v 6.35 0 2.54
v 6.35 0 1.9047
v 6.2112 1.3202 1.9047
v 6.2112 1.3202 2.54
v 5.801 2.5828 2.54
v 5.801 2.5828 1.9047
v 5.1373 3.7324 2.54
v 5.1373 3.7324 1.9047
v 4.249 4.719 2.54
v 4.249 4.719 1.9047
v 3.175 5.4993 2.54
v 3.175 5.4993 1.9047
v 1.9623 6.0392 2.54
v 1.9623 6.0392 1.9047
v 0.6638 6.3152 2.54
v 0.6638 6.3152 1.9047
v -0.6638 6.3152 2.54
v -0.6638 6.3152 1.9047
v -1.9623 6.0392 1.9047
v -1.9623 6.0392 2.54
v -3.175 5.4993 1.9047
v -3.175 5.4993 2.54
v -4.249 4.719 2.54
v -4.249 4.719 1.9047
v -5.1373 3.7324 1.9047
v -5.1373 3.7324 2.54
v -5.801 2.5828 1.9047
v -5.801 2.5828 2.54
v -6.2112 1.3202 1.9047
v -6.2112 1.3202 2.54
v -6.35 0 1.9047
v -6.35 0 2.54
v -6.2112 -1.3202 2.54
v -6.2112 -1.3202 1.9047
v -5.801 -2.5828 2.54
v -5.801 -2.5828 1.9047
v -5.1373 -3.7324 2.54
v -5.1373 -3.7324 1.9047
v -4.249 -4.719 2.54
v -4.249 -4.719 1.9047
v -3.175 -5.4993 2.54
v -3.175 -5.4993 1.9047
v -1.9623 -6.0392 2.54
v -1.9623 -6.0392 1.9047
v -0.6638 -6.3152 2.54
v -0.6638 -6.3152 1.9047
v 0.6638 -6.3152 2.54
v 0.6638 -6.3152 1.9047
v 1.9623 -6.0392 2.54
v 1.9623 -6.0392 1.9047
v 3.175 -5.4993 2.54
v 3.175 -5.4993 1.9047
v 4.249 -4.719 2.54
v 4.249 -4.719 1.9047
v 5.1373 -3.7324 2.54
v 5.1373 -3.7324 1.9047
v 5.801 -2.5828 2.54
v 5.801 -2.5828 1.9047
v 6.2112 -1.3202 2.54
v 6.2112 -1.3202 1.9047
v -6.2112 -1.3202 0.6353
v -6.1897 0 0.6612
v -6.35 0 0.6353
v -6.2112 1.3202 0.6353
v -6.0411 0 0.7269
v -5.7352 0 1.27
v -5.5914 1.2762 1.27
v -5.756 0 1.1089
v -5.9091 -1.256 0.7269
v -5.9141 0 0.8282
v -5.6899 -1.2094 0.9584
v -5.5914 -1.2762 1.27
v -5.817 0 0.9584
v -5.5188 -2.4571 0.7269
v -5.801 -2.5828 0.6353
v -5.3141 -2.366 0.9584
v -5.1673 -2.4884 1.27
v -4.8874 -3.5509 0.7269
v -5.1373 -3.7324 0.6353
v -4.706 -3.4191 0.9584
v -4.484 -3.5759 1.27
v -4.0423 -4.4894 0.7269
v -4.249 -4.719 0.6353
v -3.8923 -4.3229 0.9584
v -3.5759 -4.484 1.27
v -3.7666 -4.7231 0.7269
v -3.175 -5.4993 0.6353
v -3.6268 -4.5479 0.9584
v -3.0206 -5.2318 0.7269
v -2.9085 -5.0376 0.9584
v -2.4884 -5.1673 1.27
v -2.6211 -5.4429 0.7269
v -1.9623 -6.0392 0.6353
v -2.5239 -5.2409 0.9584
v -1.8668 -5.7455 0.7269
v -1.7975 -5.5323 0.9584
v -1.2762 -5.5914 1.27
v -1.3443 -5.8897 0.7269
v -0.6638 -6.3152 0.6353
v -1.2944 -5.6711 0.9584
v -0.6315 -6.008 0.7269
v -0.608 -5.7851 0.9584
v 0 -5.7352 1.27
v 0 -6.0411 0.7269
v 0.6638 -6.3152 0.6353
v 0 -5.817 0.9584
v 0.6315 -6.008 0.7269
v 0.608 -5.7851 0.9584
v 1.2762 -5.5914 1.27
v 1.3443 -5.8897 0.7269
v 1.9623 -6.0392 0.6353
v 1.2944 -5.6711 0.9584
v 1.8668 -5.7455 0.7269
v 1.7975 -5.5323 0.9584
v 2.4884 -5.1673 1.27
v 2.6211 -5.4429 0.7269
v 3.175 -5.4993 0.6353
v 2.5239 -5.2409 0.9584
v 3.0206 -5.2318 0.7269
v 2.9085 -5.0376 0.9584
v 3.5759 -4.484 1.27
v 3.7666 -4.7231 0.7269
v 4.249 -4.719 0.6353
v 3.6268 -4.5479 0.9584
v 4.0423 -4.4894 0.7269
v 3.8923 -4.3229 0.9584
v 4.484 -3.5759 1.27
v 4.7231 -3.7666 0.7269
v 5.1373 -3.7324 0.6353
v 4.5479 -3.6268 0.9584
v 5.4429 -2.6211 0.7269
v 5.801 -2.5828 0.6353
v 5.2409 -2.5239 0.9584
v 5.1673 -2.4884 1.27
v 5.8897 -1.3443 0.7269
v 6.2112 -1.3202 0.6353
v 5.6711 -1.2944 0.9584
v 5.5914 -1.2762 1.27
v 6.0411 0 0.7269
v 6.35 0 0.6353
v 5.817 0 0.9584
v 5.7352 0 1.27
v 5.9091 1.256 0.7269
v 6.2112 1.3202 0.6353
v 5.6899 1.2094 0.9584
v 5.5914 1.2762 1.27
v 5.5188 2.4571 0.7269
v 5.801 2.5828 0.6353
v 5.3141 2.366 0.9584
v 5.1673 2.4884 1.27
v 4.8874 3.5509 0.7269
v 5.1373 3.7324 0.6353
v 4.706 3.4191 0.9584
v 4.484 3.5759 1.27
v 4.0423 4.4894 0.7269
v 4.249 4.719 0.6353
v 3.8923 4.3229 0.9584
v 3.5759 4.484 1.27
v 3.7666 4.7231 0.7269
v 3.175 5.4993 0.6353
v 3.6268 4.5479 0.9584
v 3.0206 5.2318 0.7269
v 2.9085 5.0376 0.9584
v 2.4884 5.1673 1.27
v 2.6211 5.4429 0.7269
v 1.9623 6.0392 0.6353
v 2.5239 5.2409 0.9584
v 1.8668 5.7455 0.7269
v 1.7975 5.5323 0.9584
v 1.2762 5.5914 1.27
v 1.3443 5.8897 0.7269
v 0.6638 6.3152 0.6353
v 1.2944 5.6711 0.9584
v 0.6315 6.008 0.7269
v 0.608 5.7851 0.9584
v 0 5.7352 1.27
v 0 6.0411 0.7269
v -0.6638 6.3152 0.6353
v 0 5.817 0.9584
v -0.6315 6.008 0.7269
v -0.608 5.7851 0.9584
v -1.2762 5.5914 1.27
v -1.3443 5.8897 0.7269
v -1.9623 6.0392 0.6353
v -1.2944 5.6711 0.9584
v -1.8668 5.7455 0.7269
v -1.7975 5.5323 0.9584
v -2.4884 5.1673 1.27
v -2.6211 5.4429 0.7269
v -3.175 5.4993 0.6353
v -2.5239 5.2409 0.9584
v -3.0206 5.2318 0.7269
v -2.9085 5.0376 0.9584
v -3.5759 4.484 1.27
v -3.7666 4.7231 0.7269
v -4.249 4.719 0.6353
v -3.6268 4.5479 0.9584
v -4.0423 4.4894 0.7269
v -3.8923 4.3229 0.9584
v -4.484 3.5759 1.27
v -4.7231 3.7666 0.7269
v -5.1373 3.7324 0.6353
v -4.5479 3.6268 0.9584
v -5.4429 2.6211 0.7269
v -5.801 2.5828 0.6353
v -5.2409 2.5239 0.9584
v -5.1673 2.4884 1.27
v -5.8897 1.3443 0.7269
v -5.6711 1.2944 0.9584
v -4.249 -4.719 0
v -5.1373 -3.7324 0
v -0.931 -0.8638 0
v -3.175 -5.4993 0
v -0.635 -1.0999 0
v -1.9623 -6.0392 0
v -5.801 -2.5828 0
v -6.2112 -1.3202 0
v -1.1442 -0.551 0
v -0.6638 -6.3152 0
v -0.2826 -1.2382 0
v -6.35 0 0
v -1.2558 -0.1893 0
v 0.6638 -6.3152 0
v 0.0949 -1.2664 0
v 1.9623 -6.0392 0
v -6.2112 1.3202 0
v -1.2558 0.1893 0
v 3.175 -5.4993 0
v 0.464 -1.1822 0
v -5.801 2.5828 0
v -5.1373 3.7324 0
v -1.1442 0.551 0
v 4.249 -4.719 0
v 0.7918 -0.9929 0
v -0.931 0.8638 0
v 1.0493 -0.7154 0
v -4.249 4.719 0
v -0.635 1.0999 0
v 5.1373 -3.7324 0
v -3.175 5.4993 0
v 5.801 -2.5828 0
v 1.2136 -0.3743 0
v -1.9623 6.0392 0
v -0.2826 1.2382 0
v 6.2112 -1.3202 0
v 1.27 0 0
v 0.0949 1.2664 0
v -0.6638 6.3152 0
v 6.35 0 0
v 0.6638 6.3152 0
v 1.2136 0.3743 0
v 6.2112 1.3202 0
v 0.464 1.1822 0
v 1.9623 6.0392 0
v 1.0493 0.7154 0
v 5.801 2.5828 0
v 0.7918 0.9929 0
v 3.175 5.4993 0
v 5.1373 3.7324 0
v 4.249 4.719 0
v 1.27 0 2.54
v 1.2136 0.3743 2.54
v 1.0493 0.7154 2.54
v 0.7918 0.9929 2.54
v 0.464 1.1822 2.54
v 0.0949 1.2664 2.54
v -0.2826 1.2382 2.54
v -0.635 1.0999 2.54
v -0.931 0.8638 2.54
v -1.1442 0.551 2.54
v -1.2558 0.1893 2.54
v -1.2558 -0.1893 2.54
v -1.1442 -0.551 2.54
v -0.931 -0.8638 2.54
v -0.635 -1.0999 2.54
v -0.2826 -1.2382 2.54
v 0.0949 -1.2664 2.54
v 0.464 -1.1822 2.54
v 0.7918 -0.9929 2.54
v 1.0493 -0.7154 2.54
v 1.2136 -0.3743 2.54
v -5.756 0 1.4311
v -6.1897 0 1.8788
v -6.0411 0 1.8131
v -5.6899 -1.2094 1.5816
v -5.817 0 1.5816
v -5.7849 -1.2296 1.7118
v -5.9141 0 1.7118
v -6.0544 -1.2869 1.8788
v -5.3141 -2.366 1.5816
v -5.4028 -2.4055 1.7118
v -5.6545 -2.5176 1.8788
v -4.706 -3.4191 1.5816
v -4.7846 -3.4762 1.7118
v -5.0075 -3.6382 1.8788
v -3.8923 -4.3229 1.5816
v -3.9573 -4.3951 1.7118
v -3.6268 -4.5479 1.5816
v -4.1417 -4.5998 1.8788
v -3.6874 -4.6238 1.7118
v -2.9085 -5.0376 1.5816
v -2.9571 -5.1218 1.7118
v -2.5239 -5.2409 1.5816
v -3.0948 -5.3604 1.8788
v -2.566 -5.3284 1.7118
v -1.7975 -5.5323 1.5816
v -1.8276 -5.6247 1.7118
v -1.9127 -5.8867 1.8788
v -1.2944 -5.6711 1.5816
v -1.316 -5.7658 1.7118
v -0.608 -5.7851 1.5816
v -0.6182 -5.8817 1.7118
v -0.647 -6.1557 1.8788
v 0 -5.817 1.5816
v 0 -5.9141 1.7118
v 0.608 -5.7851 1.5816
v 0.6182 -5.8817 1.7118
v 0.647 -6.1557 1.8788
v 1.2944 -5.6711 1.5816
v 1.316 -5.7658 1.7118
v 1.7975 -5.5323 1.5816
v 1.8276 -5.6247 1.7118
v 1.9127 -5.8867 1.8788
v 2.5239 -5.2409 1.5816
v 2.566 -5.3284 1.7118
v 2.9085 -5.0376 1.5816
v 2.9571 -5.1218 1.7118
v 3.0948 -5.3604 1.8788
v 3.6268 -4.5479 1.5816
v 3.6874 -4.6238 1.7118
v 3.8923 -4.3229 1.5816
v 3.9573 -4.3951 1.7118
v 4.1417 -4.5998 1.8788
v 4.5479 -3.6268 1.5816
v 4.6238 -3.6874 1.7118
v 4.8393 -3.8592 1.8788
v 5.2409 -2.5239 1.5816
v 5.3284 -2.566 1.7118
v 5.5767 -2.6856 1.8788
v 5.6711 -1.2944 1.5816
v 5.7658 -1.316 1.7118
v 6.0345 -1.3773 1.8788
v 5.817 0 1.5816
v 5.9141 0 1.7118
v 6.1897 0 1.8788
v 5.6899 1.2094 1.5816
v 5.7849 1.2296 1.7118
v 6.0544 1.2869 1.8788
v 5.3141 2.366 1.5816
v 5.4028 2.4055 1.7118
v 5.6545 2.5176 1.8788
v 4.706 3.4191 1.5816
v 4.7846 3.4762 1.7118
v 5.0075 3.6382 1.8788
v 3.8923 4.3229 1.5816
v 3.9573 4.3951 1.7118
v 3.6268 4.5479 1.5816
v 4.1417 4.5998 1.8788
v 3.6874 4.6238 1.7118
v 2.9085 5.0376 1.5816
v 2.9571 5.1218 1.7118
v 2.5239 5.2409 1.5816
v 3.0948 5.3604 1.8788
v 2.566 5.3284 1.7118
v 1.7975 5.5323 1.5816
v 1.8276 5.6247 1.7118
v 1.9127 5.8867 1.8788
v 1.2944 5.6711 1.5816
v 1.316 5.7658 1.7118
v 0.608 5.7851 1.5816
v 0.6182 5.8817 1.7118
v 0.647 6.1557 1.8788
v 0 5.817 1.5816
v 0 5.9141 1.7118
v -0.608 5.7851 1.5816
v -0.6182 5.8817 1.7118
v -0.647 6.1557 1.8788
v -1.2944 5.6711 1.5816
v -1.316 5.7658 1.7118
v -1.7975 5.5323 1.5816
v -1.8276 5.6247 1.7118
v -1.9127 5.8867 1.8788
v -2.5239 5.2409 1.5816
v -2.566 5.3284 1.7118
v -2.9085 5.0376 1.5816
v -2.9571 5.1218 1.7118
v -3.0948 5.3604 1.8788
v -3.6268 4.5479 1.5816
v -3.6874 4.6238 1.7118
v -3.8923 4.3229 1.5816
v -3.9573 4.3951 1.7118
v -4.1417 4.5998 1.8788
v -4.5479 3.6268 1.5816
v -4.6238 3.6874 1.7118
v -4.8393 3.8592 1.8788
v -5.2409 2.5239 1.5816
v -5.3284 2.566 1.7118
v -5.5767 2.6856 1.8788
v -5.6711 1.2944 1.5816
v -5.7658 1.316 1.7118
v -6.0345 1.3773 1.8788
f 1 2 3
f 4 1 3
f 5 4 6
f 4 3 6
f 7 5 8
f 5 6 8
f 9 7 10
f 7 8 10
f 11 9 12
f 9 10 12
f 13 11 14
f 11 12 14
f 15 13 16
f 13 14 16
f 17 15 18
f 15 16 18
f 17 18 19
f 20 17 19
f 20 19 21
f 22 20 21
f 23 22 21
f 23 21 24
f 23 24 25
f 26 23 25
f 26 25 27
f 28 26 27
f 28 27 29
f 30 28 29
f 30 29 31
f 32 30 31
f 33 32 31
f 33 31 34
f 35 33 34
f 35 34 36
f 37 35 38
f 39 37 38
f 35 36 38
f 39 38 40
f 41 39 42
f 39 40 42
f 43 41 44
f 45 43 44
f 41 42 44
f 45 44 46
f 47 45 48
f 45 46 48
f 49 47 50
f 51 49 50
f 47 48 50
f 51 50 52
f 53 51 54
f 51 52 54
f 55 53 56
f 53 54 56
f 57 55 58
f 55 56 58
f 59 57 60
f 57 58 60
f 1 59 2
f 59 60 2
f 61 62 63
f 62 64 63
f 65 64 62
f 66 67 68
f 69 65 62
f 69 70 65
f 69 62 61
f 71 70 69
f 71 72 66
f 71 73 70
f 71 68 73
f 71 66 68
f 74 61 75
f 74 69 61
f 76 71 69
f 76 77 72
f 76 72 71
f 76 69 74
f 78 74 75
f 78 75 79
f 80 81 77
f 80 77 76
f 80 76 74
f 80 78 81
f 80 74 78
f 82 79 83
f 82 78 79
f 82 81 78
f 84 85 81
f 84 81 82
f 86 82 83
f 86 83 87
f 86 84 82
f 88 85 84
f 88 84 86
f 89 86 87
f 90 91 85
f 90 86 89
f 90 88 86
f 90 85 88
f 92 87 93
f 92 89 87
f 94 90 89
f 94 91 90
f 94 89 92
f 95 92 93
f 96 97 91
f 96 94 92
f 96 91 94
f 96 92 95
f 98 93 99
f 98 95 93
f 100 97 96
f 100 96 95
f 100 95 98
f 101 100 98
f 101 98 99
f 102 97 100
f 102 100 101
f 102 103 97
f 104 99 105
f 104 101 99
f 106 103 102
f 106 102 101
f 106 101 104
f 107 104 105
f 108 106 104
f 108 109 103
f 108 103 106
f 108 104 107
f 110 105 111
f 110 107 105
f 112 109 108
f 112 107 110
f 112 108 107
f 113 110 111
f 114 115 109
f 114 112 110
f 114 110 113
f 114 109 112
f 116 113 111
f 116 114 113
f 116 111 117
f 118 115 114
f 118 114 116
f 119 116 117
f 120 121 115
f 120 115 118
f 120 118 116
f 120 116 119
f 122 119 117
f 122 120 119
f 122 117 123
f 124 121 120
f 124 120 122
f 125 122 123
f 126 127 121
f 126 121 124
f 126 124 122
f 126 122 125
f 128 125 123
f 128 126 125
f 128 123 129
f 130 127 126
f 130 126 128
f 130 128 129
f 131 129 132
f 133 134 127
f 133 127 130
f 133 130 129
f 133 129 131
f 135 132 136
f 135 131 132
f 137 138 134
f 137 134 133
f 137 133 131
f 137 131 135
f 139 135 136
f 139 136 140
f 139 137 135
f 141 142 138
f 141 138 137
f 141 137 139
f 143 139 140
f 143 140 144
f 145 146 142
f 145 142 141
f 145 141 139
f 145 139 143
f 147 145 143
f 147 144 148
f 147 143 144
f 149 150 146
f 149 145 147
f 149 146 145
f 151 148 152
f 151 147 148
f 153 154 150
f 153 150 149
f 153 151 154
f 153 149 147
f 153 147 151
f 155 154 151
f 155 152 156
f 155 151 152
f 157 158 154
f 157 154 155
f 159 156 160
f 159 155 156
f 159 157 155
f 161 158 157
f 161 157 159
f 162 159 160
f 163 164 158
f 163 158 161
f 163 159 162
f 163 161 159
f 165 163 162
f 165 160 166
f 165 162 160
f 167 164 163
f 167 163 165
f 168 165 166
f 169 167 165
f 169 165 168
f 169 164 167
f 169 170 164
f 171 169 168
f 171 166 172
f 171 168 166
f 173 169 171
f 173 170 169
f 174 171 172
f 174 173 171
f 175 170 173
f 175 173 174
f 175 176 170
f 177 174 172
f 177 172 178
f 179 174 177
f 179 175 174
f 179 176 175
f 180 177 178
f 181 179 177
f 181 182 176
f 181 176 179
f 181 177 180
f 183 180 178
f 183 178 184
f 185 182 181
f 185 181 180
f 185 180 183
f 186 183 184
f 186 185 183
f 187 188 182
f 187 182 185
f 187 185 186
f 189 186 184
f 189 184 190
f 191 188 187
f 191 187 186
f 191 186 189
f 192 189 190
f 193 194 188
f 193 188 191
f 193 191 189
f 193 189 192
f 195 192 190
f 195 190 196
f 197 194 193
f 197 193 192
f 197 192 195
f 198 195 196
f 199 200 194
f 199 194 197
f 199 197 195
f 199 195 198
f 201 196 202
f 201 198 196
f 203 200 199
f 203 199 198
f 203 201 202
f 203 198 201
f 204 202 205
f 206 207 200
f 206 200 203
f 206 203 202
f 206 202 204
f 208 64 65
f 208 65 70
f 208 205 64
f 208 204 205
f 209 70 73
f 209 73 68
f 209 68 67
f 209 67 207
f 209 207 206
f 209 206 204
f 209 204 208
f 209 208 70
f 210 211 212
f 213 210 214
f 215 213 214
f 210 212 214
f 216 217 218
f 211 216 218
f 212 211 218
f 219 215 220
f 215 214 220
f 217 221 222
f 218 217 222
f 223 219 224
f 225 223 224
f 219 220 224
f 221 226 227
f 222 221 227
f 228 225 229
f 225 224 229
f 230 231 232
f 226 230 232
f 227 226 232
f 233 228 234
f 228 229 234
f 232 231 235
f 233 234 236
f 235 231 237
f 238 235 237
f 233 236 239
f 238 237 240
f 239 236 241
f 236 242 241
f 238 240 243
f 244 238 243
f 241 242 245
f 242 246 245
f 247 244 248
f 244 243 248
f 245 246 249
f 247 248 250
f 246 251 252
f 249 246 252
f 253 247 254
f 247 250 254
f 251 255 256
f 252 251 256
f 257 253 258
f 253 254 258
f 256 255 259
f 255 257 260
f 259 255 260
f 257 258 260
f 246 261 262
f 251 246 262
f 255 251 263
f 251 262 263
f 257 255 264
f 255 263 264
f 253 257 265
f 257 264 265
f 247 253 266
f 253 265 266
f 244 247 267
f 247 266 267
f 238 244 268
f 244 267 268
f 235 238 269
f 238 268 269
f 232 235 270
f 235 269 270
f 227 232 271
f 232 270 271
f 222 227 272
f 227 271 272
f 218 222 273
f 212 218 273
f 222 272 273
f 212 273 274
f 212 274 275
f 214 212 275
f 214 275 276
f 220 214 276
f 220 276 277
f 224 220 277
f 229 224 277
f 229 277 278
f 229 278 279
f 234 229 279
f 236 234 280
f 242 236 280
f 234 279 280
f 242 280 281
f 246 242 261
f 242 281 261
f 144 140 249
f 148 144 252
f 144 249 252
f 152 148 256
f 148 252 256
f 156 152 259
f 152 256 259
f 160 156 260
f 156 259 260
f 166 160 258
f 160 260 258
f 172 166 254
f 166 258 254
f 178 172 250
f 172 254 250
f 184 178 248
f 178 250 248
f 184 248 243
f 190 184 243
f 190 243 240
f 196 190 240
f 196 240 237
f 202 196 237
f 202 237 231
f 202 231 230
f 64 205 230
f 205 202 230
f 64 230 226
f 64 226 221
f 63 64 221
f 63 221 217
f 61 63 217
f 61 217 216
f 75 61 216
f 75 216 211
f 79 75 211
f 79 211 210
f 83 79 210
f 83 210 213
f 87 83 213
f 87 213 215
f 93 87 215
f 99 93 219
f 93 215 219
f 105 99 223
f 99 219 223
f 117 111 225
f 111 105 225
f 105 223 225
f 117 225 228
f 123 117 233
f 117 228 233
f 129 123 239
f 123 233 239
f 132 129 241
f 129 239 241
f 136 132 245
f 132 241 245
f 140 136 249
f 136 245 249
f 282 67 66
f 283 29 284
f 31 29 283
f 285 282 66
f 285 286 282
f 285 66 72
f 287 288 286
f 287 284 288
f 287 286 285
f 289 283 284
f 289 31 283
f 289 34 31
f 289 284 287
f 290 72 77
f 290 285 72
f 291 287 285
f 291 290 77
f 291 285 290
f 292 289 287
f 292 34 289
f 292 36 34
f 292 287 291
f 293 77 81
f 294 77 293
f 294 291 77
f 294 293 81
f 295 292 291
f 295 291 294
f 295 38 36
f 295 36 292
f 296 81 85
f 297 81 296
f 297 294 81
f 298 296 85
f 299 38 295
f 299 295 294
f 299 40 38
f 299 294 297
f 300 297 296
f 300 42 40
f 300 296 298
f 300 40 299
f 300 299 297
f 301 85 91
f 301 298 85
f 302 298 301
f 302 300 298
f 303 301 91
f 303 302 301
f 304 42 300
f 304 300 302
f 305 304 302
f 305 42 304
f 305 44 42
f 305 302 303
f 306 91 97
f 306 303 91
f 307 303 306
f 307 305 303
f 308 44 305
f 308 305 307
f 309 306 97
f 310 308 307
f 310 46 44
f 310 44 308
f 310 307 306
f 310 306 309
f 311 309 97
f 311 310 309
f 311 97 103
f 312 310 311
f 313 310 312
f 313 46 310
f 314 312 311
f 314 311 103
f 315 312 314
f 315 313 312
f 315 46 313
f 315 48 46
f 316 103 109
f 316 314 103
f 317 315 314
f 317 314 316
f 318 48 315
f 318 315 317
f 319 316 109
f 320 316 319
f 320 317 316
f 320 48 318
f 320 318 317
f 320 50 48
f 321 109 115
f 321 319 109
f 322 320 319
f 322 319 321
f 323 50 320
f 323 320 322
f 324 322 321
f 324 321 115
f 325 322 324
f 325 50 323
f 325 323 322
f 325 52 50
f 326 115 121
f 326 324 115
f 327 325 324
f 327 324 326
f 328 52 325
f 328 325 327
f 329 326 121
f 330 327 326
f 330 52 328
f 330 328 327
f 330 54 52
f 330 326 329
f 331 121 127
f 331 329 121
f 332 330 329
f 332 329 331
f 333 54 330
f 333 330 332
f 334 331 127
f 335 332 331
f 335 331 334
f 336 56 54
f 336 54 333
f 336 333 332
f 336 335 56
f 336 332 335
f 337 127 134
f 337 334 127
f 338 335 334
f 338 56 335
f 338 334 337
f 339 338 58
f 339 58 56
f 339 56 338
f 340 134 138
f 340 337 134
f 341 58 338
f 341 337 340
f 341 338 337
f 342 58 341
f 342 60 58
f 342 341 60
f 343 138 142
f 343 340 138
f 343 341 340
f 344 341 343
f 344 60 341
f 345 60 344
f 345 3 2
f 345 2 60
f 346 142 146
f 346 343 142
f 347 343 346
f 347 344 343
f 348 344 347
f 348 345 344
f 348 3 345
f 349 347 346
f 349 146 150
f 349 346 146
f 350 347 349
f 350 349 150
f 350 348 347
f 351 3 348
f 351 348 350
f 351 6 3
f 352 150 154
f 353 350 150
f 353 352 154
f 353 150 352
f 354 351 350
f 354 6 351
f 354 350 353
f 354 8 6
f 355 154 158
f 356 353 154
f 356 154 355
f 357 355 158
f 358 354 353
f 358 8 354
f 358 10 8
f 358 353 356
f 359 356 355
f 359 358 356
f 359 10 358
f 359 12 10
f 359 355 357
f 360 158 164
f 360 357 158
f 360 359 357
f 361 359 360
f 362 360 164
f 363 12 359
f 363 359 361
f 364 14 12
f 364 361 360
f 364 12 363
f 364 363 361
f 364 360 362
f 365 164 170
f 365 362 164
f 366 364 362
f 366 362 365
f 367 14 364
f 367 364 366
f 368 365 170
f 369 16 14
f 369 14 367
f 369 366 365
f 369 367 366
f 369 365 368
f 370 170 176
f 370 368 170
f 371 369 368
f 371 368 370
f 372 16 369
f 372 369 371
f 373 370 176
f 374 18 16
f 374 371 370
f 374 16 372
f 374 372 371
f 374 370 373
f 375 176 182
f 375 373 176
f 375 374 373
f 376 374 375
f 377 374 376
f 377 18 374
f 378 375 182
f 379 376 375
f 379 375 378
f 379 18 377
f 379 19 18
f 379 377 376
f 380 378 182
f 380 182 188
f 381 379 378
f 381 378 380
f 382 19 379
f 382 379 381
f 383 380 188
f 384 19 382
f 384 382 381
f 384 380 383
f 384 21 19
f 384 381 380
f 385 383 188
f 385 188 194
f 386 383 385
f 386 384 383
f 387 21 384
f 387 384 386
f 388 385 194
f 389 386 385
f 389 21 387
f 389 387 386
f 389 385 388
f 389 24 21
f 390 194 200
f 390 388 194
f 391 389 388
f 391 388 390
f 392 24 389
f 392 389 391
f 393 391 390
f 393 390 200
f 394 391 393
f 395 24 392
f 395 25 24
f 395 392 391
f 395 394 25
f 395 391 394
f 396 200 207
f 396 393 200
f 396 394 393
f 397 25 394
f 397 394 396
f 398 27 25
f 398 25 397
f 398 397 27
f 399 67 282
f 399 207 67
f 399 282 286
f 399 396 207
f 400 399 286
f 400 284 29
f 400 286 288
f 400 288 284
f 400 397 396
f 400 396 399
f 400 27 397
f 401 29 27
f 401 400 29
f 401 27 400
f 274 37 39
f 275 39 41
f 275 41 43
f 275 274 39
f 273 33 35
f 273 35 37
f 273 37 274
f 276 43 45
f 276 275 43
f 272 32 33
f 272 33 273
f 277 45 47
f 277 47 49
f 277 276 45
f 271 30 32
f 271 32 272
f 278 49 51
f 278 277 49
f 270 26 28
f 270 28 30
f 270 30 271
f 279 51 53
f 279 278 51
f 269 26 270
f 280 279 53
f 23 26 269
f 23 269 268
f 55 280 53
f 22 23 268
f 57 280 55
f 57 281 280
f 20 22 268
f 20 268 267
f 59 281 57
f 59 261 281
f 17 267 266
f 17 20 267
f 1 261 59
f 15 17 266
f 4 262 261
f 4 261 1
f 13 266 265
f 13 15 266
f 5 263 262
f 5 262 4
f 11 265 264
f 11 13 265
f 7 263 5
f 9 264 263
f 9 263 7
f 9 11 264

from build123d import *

# Parameters (mm, degrees)
F0_R     = 6.35
F1_DEPTH = 2.54
F2_R     = 0.635
F4_R     = 1.27
F5_DEPTH = 2.54


with BuildPart() as f1:
    # F0 (on Top) → F1 (new body)
    with BuildSketch(Plane.XY):
        Circle(F0_R)
    extrude(amount=F1_DEPTH)

    # F2 (on Front) → F3 (revolve, cut)
    with BuildSketch(Plane.XZ):
        with Locations((-6.370238, 1.27)):
            Circle(F2_R)
    revolve(axis=Axis((0, 0, 2.54), (0, 0, 1)), mode=Mode.SUBTRACT)

    # F4 (on face) → F5 (cut)
    with BuildSketch(Plane.XY.offset(2.54)):
        Circle(F4_R)
    extrude(amount=-F5_DEPTH, mode=Mode.SUBTRACT)


solid = f1.part
